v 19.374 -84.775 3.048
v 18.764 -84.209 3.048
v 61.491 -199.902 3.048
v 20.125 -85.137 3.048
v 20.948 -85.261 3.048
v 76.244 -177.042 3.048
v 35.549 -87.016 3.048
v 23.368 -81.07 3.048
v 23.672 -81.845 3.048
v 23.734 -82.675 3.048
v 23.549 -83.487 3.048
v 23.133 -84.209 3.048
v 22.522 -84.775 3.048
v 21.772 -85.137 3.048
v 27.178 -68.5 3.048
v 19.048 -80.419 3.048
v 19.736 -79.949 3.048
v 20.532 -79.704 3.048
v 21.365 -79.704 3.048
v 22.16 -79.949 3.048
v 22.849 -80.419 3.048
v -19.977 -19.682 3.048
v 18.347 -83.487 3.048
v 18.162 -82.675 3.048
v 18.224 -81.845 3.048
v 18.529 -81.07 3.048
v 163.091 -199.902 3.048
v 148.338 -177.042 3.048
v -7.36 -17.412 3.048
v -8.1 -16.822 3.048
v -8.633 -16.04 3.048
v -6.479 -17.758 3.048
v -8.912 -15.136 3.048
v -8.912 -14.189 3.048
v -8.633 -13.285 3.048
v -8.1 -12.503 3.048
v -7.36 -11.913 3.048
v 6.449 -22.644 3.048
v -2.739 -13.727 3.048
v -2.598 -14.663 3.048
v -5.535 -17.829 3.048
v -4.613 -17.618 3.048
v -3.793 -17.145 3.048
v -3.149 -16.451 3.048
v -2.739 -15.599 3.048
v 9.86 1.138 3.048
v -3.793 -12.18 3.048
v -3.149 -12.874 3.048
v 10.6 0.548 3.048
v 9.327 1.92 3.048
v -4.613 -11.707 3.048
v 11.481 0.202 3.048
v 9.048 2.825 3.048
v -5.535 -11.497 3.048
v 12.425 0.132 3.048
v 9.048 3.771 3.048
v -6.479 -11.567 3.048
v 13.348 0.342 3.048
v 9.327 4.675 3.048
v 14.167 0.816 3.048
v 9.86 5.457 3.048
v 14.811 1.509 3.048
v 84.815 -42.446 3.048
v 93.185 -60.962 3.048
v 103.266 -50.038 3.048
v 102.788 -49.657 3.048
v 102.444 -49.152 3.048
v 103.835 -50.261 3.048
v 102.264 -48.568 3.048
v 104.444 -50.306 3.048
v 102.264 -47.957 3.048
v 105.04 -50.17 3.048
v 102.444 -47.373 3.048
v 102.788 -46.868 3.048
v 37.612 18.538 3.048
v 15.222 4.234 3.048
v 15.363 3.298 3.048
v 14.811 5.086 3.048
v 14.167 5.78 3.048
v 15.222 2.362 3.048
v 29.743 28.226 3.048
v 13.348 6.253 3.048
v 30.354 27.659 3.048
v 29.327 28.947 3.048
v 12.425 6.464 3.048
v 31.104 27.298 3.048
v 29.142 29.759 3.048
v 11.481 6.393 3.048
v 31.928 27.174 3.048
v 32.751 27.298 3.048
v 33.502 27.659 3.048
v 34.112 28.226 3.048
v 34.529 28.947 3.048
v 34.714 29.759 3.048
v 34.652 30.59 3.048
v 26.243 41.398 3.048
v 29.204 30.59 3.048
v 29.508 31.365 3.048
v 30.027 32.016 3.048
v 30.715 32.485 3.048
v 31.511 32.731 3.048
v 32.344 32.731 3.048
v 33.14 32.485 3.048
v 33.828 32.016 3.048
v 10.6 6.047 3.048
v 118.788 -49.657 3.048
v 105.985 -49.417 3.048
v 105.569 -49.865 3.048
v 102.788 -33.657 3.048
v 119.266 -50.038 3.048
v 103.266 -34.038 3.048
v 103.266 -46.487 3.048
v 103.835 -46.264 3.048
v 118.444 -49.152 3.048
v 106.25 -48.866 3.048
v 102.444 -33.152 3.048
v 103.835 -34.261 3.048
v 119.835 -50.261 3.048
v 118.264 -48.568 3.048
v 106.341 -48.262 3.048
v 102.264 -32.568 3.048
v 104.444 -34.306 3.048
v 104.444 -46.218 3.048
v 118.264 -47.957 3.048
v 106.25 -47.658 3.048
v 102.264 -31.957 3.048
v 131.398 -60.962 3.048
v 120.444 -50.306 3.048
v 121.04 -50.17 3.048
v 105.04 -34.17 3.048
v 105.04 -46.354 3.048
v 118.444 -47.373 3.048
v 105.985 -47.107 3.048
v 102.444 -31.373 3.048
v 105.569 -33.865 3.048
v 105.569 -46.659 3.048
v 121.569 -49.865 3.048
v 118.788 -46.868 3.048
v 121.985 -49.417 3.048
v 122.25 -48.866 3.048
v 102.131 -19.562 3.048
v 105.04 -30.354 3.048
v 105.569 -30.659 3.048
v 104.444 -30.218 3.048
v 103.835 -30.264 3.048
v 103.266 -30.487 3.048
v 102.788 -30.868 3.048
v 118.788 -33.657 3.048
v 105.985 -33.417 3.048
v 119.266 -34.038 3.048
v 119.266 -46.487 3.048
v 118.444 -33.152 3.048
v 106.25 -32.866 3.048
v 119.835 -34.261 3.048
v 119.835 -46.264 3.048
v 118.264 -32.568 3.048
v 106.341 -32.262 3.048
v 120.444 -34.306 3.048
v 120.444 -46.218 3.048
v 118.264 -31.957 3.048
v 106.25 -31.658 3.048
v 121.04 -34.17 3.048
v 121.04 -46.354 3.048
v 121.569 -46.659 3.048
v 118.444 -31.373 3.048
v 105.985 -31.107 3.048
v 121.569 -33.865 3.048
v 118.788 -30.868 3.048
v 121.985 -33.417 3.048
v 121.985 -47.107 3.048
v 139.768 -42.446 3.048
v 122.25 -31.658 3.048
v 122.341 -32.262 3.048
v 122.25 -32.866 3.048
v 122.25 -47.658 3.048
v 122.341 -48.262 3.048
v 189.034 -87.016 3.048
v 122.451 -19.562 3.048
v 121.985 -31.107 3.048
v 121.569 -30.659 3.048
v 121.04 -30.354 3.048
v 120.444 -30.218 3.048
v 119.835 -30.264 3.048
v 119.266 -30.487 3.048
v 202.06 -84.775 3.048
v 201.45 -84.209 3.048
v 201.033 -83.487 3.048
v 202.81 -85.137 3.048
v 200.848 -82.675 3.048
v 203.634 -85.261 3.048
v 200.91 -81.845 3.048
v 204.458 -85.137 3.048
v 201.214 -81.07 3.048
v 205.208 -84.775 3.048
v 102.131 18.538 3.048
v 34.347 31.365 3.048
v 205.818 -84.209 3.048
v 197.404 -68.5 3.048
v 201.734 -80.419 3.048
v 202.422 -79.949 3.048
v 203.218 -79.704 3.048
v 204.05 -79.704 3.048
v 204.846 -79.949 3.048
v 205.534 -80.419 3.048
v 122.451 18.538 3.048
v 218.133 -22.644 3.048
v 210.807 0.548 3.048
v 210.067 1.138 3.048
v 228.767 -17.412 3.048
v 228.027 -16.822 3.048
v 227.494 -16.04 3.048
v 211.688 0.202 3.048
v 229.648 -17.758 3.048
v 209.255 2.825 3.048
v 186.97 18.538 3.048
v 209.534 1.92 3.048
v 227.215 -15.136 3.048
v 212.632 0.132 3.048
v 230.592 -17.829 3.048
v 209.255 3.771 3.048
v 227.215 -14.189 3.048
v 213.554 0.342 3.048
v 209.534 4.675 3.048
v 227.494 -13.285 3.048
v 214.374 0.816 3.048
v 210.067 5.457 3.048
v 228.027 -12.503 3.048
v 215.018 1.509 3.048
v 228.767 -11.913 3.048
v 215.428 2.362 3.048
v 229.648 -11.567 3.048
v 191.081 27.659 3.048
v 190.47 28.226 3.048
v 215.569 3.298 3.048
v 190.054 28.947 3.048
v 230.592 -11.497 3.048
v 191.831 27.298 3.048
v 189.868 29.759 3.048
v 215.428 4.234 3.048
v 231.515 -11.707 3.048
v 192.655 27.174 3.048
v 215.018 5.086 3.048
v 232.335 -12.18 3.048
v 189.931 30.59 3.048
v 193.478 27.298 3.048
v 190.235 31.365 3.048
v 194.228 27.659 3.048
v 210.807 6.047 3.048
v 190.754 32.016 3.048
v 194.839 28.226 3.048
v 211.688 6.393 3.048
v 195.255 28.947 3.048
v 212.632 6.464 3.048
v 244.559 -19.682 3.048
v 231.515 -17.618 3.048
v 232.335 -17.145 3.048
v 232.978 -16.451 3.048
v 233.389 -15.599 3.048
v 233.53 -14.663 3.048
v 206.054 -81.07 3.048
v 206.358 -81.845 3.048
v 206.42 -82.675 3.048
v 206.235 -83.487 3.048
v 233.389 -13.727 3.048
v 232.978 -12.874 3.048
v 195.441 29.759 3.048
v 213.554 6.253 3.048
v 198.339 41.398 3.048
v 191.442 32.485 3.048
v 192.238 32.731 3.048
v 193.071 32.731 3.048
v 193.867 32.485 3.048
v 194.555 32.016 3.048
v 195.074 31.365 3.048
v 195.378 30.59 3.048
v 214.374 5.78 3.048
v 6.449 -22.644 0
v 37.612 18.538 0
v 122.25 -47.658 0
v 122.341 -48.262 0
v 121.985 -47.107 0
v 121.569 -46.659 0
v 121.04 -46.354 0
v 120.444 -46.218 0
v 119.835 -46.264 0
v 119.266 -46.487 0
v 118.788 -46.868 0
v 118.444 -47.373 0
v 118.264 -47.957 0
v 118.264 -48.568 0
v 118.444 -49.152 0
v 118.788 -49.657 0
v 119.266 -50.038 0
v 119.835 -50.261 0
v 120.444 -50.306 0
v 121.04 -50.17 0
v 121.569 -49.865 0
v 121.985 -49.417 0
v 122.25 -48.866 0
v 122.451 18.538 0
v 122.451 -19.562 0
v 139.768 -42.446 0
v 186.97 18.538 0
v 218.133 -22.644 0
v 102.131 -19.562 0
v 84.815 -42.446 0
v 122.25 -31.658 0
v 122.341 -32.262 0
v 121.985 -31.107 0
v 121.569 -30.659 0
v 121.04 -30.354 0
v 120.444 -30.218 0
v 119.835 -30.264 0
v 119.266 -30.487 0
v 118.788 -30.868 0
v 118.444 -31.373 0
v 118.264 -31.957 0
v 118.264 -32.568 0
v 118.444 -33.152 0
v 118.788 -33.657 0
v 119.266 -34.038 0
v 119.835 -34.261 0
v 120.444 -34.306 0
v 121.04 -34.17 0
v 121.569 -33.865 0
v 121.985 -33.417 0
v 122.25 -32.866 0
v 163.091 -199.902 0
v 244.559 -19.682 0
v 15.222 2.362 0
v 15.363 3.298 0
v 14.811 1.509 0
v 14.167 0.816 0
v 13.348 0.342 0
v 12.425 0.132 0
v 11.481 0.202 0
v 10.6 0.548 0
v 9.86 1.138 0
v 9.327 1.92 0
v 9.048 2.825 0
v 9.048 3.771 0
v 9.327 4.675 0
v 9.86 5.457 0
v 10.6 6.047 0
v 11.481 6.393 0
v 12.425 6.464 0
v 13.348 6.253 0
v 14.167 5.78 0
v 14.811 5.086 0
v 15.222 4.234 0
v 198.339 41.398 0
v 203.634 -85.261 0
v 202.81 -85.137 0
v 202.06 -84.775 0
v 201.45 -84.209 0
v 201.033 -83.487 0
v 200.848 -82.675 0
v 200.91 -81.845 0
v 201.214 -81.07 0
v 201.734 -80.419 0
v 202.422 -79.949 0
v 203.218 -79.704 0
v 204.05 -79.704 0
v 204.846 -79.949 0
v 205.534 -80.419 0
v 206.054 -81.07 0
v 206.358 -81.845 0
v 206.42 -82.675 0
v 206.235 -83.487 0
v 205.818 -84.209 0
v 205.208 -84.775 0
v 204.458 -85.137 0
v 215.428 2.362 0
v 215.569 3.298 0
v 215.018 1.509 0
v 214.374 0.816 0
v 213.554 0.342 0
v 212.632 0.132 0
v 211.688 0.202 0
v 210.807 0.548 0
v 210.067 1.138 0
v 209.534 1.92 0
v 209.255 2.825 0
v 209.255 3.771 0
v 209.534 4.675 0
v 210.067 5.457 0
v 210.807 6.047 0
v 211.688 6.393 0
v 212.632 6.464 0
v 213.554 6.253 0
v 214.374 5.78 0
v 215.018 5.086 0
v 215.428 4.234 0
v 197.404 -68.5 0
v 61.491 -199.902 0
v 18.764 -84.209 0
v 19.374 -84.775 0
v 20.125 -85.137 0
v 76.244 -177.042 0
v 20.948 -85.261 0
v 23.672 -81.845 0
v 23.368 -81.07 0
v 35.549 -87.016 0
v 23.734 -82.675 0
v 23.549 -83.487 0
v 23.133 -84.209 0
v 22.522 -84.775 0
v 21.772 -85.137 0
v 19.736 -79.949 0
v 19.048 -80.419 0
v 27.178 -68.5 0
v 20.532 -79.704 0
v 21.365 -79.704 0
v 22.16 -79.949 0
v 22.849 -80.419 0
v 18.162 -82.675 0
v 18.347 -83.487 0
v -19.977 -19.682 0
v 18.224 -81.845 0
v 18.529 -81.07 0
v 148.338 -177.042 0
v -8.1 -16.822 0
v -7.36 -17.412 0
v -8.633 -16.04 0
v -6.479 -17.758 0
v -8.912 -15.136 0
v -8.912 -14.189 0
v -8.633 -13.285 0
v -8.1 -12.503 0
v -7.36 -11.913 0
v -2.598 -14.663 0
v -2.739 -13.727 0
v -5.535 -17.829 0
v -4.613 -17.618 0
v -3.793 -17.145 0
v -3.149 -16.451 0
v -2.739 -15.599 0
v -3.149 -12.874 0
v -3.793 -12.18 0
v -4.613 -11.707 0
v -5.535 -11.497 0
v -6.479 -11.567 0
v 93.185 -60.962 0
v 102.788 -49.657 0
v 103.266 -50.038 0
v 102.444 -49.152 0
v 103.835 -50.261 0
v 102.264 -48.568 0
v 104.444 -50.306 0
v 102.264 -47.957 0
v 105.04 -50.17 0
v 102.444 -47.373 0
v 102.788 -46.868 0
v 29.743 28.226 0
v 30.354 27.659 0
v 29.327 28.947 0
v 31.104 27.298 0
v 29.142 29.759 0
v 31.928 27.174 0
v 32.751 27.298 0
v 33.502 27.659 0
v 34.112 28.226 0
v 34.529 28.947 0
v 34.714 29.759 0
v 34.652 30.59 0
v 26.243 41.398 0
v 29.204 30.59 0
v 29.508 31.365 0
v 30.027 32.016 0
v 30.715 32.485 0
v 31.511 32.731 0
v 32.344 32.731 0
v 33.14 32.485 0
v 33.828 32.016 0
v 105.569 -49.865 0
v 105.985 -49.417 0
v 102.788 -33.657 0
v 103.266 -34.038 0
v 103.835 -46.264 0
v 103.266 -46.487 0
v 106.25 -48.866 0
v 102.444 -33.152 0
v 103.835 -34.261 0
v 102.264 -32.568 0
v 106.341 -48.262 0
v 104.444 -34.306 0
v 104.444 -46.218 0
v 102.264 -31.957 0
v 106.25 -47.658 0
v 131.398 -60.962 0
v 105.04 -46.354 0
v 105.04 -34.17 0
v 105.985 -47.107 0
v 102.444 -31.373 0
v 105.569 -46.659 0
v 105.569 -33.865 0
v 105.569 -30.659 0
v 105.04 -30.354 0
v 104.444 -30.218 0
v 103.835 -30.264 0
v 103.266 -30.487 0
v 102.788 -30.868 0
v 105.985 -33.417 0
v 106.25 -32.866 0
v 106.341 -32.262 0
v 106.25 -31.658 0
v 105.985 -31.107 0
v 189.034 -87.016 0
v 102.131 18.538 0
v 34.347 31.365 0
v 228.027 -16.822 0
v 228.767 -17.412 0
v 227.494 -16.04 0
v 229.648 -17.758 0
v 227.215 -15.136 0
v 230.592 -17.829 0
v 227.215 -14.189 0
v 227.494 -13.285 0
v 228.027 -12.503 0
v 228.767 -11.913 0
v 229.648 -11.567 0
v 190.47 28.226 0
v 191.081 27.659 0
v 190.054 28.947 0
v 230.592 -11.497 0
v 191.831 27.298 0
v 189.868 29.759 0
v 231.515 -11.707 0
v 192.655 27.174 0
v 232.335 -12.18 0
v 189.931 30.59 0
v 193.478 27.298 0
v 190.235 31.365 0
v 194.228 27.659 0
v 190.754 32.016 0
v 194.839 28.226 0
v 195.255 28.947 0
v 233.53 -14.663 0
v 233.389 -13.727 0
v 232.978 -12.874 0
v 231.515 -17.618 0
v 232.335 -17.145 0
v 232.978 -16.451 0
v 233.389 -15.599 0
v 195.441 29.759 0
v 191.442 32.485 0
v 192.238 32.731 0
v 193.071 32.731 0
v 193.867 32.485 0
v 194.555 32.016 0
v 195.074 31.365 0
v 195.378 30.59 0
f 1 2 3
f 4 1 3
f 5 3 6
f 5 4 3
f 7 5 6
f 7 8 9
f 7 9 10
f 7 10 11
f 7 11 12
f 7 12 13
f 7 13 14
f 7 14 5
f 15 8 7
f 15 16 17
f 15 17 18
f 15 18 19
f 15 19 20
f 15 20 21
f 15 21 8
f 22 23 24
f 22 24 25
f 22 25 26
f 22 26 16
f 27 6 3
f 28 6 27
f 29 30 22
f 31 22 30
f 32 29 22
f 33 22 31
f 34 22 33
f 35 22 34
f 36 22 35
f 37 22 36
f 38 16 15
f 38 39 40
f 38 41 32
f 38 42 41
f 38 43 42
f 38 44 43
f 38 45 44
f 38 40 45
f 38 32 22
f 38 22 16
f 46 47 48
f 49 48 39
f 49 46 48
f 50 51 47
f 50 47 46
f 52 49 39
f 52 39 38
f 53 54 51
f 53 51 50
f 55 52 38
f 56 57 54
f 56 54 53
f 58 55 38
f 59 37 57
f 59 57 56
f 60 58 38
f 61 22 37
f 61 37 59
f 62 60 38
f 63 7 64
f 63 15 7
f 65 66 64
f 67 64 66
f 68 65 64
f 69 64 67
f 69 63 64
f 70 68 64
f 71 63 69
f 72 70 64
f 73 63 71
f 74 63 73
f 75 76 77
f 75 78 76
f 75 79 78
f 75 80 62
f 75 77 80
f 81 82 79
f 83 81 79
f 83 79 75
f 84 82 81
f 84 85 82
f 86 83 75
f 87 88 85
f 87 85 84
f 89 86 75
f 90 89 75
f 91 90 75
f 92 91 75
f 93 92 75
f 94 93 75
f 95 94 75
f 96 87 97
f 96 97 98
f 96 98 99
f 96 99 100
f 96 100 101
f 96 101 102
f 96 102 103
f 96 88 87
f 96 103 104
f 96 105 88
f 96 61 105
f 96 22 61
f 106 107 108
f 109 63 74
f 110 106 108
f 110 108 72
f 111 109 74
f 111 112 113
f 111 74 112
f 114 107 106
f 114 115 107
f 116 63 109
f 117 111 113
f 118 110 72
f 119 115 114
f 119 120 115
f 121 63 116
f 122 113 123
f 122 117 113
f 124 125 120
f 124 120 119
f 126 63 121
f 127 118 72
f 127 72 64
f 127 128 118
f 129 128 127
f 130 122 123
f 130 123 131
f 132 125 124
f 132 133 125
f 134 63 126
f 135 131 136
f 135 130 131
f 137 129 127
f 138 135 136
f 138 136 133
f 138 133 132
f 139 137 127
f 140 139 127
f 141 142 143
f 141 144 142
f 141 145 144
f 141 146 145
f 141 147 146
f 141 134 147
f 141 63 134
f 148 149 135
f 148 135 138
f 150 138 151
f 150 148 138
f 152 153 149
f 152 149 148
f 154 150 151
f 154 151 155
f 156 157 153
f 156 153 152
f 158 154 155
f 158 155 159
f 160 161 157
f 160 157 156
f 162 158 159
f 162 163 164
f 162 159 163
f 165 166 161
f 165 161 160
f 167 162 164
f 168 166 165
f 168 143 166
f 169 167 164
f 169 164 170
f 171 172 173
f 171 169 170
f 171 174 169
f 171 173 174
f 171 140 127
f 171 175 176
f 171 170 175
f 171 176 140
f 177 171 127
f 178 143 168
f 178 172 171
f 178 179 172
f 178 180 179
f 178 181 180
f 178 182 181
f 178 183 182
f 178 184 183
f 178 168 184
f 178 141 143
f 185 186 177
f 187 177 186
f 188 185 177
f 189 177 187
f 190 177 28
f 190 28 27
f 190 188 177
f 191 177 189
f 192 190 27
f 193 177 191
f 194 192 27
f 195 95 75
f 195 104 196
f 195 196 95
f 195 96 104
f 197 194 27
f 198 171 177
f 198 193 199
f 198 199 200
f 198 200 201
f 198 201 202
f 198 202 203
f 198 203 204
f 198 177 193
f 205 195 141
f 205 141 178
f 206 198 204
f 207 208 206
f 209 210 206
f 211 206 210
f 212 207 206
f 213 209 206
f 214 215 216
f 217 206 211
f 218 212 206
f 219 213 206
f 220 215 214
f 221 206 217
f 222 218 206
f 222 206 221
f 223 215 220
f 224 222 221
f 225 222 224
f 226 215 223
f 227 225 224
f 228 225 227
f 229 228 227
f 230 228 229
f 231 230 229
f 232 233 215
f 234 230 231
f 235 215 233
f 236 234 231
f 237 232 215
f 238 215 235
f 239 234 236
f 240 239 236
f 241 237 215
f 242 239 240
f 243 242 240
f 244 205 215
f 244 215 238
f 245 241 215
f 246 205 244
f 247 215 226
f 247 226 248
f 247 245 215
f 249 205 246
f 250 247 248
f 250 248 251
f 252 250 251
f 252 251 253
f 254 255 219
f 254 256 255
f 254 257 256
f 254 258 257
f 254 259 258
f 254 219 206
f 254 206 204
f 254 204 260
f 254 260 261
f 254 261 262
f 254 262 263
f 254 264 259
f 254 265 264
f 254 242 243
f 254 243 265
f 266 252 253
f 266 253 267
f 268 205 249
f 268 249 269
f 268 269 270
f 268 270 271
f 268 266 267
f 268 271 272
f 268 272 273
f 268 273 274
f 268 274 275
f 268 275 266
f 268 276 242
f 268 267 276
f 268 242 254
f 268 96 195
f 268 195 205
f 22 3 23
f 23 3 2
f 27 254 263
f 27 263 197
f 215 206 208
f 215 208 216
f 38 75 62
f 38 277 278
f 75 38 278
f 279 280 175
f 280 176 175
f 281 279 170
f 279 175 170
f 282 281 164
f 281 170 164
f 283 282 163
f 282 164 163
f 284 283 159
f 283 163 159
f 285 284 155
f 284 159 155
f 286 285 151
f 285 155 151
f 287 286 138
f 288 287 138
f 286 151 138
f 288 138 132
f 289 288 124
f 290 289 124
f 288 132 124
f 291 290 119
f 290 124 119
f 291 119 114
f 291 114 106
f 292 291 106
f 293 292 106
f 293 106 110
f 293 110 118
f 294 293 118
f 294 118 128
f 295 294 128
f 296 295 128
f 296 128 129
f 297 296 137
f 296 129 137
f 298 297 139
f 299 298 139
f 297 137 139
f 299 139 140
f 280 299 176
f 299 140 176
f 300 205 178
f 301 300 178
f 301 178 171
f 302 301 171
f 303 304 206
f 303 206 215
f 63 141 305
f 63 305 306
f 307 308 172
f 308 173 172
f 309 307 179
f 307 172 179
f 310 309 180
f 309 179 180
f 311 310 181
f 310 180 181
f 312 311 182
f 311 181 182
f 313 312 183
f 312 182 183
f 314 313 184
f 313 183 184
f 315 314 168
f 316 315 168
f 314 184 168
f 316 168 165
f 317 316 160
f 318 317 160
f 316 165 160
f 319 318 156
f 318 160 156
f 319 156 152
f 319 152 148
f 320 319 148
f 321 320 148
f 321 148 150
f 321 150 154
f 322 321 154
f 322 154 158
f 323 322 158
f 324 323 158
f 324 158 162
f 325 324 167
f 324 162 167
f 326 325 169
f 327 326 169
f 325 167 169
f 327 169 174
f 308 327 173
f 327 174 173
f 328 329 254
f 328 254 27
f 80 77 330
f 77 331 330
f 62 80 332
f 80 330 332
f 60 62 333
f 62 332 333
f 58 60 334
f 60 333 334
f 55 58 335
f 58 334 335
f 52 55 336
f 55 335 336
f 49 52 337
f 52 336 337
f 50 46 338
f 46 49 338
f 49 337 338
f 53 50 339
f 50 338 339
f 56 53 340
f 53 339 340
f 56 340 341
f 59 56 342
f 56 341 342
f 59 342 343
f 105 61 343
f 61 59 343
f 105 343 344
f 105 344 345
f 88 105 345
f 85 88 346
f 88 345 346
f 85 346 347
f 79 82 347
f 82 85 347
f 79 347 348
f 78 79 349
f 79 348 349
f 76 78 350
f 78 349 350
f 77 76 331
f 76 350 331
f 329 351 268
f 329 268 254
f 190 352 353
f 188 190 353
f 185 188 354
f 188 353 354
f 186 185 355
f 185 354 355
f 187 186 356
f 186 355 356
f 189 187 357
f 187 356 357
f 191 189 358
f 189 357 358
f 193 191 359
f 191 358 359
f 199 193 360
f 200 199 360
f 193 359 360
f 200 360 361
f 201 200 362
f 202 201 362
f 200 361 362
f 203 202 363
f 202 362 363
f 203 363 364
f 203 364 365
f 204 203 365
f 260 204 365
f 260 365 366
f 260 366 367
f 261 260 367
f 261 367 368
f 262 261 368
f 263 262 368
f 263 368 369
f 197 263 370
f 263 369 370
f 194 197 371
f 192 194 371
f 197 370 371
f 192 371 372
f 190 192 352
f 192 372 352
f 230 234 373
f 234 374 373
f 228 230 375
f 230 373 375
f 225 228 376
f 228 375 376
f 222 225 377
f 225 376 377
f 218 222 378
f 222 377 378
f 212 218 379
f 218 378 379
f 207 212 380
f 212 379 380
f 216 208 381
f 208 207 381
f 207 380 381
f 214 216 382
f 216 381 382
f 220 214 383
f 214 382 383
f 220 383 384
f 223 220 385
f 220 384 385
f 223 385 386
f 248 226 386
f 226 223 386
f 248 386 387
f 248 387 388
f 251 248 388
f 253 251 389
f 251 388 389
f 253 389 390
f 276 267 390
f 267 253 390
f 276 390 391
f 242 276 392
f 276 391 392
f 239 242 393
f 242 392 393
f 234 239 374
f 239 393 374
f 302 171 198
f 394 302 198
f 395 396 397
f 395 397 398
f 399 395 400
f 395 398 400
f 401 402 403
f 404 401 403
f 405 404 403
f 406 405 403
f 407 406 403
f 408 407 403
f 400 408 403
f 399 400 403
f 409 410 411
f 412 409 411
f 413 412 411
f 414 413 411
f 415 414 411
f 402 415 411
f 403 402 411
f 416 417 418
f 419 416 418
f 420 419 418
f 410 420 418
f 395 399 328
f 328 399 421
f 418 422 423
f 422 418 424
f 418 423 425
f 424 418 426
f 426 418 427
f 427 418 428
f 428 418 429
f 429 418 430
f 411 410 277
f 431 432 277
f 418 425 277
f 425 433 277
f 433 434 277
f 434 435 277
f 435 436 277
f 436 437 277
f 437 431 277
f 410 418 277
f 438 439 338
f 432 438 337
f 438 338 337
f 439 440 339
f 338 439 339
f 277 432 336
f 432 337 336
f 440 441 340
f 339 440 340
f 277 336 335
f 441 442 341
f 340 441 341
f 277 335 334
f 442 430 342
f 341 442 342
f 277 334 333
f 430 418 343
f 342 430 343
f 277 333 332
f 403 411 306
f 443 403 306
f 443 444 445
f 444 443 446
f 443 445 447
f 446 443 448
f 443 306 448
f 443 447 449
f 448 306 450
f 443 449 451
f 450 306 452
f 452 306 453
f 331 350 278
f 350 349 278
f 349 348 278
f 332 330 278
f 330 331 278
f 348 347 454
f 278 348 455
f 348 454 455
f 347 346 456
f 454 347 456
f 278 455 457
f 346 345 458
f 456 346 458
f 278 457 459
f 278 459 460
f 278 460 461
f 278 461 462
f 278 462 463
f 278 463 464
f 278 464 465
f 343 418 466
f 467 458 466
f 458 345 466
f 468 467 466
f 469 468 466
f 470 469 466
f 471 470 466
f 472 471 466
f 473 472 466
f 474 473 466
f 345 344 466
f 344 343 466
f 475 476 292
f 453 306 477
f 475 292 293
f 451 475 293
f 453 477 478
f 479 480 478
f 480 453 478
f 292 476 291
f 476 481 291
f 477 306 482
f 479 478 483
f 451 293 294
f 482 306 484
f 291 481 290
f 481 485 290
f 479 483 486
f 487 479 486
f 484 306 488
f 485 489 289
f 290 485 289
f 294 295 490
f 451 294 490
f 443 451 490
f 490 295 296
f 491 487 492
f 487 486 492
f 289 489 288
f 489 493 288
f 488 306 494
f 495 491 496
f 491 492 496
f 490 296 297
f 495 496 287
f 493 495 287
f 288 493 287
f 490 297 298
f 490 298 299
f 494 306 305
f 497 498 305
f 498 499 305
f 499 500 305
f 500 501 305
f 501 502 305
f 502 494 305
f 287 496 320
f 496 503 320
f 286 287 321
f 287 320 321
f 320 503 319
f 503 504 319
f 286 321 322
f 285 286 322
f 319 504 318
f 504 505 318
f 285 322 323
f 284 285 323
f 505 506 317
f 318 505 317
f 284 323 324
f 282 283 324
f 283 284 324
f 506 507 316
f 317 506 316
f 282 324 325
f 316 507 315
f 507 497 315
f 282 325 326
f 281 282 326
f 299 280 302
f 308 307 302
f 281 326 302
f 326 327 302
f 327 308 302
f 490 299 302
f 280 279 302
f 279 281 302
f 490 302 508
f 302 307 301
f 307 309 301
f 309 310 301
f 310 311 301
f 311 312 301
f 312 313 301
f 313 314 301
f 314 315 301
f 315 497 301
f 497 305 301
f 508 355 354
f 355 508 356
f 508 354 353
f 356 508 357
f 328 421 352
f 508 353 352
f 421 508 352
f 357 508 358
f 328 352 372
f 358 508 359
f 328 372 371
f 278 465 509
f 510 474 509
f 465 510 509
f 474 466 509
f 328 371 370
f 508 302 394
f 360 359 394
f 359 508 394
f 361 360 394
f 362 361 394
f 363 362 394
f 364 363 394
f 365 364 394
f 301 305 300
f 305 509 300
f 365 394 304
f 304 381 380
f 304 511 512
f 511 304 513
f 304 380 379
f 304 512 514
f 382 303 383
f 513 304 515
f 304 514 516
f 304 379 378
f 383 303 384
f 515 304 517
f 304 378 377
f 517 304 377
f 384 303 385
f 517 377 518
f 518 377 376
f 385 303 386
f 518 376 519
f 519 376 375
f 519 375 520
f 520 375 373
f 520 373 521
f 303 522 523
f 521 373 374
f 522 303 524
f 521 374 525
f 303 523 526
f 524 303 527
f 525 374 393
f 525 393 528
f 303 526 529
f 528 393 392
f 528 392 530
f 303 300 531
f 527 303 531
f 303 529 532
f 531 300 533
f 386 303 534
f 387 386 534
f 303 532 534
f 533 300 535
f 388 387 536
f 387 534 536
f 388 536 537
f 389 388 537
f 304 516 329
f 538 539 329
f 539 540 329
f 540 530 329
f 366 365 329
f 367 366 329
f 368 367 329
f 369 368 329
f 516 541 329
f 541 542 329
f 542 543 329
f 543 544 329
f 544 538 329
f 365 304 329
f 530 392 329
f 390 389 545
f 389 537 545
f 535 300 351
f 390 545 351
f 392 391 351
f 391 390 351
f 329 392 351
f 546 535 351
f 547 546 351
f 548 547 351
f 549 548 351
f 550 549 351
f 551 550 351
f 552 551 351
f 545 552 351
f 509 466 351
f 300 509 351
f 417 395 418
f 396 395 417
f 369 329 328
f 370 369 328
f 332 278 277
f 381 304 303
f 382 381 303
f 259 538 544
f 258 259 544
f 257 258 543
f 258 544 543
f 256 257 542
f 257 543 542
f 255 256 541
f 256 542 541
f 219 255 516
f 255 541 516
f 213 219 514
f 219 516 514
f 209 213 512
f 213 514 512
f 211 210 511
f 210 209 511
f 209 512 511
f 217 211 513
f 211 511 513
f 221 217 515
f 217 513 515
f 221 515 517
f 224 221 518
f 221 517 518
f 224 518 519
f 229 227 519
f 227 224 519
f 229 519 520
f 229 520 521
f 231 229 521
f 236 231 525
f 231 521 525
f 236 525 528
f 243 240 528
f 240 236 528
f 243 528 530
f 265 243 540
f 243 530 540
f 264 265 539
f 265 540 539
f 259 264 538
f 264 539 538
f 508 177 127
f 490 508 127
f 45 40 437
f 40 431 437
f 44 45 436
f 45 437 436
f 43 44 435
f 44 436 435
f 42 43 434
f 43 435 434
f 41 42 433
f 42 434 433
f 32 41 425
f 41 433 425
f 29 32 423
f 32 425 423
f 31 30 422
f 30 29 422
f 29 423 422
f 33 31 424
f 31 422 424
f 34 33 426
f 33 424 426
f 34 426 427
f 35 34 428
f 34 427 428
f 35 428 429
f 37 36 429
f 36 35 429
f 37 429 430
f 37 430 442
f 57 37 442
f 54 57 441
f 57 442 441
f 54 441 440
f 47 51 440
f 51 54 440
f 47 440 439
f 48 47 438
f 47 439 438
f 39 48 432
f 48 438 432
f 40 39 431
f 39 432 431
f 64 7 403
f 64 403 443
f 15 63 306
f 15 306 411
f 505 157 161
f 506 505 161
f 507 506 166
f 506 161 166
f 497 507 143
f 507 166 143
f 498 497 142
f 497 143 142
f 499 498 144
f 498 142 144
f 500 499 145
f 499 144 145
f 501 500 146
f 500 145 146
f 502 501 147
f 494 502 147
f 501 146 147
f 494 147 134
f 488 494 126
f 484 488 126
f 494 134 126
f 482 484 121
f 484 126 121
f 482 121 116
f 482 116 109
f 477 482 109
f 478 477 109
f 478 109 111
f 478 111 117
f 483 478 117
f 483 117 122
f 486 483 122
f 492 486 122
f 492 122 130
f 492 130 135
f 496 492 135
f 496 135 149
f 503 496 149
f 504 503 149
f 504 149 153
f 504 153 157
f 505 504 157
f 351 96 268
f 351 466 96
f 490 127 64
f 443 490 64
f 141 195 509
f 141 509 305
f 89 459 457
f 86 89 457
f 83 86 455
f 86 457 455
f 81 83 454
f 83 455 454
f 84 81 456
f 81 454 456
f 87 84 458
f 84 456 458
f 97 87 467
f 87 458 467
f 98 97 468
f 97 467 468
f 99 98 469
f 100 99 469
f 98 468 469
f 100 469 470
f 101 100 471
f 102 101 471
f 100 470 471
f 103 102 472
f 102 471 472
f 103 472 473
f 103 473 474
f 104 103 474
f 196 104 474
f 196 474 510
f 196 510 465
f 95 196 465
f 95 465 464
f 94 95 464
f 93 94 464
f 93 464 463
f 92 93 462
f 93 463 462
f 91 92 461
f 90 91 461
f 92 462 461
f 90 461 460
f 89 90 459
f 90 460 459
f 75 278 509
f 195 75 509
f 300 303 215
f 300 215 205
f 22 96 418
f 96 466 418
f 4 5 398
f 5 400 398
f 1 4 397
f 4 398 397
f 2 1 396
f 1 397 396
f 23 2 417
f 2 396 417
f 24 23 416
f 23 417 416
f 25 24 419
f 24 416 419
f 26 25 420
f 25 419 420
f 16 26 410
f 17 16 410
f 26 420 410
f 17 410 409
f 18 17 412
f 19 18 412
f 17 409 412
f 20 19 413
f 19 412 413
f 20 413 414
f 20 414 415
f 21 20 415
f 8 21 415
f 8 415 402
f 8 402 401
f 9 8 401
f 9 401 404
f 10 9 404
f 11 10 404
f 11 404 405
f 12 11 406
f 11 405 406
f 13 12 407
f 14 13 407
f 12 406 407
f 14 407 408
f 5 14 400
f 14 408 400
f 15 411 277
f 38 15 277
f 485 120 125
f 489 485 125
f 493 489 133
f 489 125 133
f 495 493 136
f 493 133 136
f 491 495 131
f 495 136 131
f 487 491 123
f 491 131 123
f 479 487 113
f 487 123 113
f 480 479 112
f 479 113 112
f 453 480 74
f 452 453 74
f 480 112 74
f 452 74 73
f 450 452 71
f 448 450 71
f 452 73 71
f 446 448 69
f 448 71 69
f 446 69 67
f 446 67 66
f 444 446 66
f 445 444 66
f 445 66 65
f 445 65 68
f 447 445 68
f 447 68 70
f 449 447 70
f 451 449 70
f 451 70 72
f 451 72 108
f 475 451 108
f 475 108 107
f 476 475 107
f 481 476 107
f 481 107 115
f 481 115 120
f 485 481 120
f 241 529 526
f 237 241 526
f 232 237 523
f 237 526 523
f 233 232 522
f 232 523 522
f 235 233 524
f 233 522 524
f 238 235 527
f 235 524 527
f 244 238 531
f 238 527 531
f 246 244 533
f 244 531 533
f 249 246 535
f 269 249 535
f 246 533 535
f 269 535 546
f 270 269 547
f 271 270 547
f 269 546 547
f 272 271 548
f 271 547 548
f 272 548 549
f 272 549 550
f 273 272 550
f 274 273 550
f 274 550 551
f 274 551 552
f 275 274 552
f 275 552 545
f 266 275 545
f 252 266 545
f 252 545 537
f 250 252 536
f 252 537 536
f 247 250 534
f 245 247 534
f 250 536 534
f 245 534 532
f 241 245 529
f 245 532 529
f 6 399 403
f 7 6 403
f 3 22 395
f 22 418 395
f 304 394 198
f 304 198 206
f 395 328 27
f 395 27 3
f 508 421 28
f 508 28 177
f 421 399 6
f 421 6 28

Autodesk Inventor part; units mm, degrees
ref_plane "YZ Plane" through (0, 0, 0) normal (1, 0, 0) x (0, 1, 0)
ref_plane "XZ Plane" through (0, 0, 0) normal (0, 1, 0) x (-1, 0, 0)
ref_plane "XY Plane" through (0, 0, 0) normal (0, 0, 1) x (1, 0, 0)
sketch "Base" plane through (0, 0, 0) normal (0, 0, 1) x (1, 0, 0)
  circle A0 centre (12.187819, 3.297819) radius 3.175
  circle A1 centre (-5.772693, -14.662693) radius 3.175
  circle A2 centre (212.394424, 3.297819) radius 3.175
  circle A3 centre (230.354936, -14.662693) radius 3.175
  arc A4 (-21.168075, -17.047312) -> (9.622688, 23.64295) centre (-130.364106, 97.577494) ccw construction
  arc A5 (214.959555, 23.64295) -> (245.750318, -17.047312) centre (354.946349, 97.577494) ccw construction
  line L0 (26.243247, 41.397819) -> (-19.976862, -19.682458)
  line L1 (12.187819, 3.297819) -> (212.394424, 3.297819) construction
  line L2 (112.291121, 41.397819) -> (112.291121, -199.902181) construction
  line L3 (26.243247, 41.397819) -> (112.291121, 41.397819)
  line L4 (-19.976862, -19.682458) -> (61.491121, -199.902181)
  line L5 (61.491121, -199.902181) -> (112.291121, -199.902181)
  line L6 (9.622688, 23.64295) -> (-21.168075, -17.047312) construction
  line L7 (-19.976862, -19.682458) -> (-21.168075, -17.047312) construction
  line L8 (62.346745, -145.552947) -> (162.235762, -145.552947) construction
  line L9 (89.431121, 18.537819) -> (89.431121, -177.042181) construction
  line L10 (89.431121, -177.042181) -> (76.244498, -177.042181)
  line L11 (76.244498, -177.042181) -> (6.449214, -22.644267)
  line L12 (6.449214, -22.644267) -> (37.612145, 18.537819)
  line L13 (37.612145, 18.537819) -> (89.431121, 18.537819)
  line L14 (89.431121, 18.537819) -> (112.291121, 18.537819)
  line L15 (89.431121, -177.042181) -> (112.291121, -177.042181)
  line L16 (198.338996, 41.397819) -> (244.559105, -19.682458)
  line L17 (198.338996, 41.397819) -> (112.291121, 41.397819)
  line L18 (244.559105, -19.682458) -> (163.091121, -199.902181)
  line L19 (163.091121, -199.902181) -> (112.291121, -199.902181)
  line L20 (135.151121, -177.042181) -> (148.337745, -177.042181)
  line L21 (148.337745, -177.042181) -> (218.133029, -22.644267)
  line L22 (218.133029, -22.644267) -> (186.970097, 18.537819)
  line L23 (186.970097, 18.537819) -> (135.151121, 18.537819)
  line L24 (135.151121, 18.537819) -> (112.291121, 18.537819)
  line L25 (135.151121, -177.042181) -> (112.291121, -177.042181)
  point P0 (0, 0)
  point P1 (112.291121, 3.297819)
extrude "Plate1" add sketch "Base" along normal blind 3.048
sketch "Sketch2" plane through (0, 0, 3.048) normal (0, 0, 1) x (1, 0, 0)
  circle A0 centre (104.291121, -48.262182) radius 2.05
  circle A1 centre (104.291121, -32.262181) radius 2.05
  circle A2 centre (120.291122, -32.262181) radius 2.05
  circle A3 centre (120.291122, -48.262182) radius 2.05
  line L0 (120.291122, -32.262181) -> (104.291121, -32.262181) construction
  line L1 (104.291121, -32.262181) -> (104.291121, -48.262182) construction
  line L2 (104.291121, -48.262182) -> (120.291122, -48.262182) construction
  line L3 (120.291122, -48.262182) -> (120.291122, -32.262181) construction
  line L4 (186.970097, 18.537819) -> (37.612145, 18.537819)
  line L5 (148.337745, -177.042181) -> (76.244498, -177.042181)
  line L6 (112.291121, 18.537819) -> (112.291121, -177.042181) construction
  line L7 (76.244498, -177.042181) -> (148.337745, -177.042181)
  line L8 (122.451121, 18.537819) -> (122.451121, -19.562181)
  line L9 (122.451121, -19.562181) -> (139.767673, -42.446156)
  line L10 (139.767673, -42.446156) -> (197.403821, -68.500466)
  line L11 (218.133029, -22.644267) -> (148.337745, -177.042181)
  line L12 (189.033686, -87.016493) -> (131.397539, -60.962182)
  line L13 (131.397539, -60.962182) -> (112.291121, -60.962182)
  line L14 (218.133029, -22.644267) -> (186.970097, 18.537819)
  line L15 (148.337745, -177.042181) -> (218.133029, -22.644267)
  line L16 (122.451121, -19.562181) -> (112.291121, -19.562181) construction
  line L17 (139.767673, -42.446156) -> (131.397539, -60.962182) construction
  line L18 (102.131121, 18.537819) -> (102.131121, -19.562181)
  line L19 (102.131121, -19.562181) -> (84.81457, -42.446156)
  line L20 (84.81457, -42.446156) -> (27.178422, -68.500466)
  line L21 (35.548557, -87.016493) -> (93.184704, -60.962182)
  line L22 (93.184704, -60.962182) -> (112.291121, -60.962182)
  line L23 (122.451121, 18.537819) -> (102.131121, 18.537819)
  line L24 (197.403821, -68.500466) -> (189.033686, -87.016493)
  line L25 (27.178422, -68.500466) -> (35.548557, -87.016493)
  line L26 (76.244498, -177.042181) -> (6.449214, -22.644267)
  point P0 (0, 0)
  point P1 (112.291121, -32.262181)
  dimension "d8" = 16
  dimension "d9" = 16
  dimension "d10" = 50.8
  dimension "d11" = 10.16
  dimension "d12" = 20.32
  dimension "d13" = 12.7
  dimension "d14" = 12.7
sheet face with bend "Face2" sketch "Sketch2" thickness 3.048 toward (0, 0, -1) bend radius 3.048 contours L8 L9 L10 L11 L12 L13 L22 L21 L25 L20 L19 L18 L4
bend "Bend1"
sketch "Sketch3" plane through (0, 0, 3.048) normal (0, 0, 1) x (1, 0, 0)
  circle A0 centre (31.927696, 29.967819) radius 2.794
  line L0 (26.243247, 41.397819) -> (-19.976862, -19.682458)
  line L1 (6.449214, -22.644267) -> (37.612145, 18.537819)
  line L2 (26.243247, 41.397819) -> (37.612145, 18.537819) construction
  line L3 (186.970097, 18.537819) -> (218.133029, -22.644267)
  line L4 (244.559105, -19.682458) -> (198.338996, 41.397819)
  line L5 (186.970097, 18.537819) -> (198.338996, 41.397819) construction
  circle A1 centre (192.654547, 29.967819) radius 2.794
  line L6 (27.178422, -68.500466) -> (6.449214, -22.644267)
  line L7 (27.178422, -68.500466) -> (35.548557, -87.016493) construction
  line L8 (31.36349, -77.75848) -> (10.53296, -87.174881) construction
  line L9 (61.491121, -199.902181) -> (-19.976862, -19.682458)
  circle A2 centre (20.948225, -82.466681) radius 2.794
  line L10 (26.243247, 41.397819) -> (198.338996, 41.397819)
  line L11 (112.291121, 41.397819) -> (112.291121, -60.962182) construction
  line L12 (93.184704, -60.962182) -> (131.397539, -60.962182)
  circle A3 centre (203.634018, -82.466681) radius 2.794
  point P0 (0, 0)
  dimension "d20" = 5.588
  dimension "d21" = 5.588
hole "Hole1" at (31.927696, 29.967819, 3.048) at (192.654547, 29.967819, 3.048) at (20.948225, -82.466681, 3.048) at (203.634018, -82.466681, 3.048) direction (0, 0, -1) diameter 5.588 end through all
equation "\"d12\" = 2 * d11"
equation "\"d27\" = Thickness"
equation "\"d7\" = Thickness"
equation "\"d15\" = BendRadius"
equation "\"d16\" = BendReliefWidth"
equation "\"d18\" = MinimumRemnant"
equation "\"d17\" = BendReliefDepth"
equation "\"d19\" = TransitionRadius"
equation "\"BendRadius\" = Thickness"
equation "\"BendReliefWidth\" = Thickness"
equation "\"BendReliefDepth\" = 0.5 * Thickness"
equation "\"CornerReliefSize\" = 4 * Thickness"
equation "\"MinimumRemnant\" = 2 * Thickness"
equation "\"TransitionRadius\" = BendRadius"
equation "\"JacobiRadiusSize\" = BendRadius"
equation "\"GapSize\" = Thickness"
equation "\"Thickness\" = 3.048"
properties part number "ChestMount"
